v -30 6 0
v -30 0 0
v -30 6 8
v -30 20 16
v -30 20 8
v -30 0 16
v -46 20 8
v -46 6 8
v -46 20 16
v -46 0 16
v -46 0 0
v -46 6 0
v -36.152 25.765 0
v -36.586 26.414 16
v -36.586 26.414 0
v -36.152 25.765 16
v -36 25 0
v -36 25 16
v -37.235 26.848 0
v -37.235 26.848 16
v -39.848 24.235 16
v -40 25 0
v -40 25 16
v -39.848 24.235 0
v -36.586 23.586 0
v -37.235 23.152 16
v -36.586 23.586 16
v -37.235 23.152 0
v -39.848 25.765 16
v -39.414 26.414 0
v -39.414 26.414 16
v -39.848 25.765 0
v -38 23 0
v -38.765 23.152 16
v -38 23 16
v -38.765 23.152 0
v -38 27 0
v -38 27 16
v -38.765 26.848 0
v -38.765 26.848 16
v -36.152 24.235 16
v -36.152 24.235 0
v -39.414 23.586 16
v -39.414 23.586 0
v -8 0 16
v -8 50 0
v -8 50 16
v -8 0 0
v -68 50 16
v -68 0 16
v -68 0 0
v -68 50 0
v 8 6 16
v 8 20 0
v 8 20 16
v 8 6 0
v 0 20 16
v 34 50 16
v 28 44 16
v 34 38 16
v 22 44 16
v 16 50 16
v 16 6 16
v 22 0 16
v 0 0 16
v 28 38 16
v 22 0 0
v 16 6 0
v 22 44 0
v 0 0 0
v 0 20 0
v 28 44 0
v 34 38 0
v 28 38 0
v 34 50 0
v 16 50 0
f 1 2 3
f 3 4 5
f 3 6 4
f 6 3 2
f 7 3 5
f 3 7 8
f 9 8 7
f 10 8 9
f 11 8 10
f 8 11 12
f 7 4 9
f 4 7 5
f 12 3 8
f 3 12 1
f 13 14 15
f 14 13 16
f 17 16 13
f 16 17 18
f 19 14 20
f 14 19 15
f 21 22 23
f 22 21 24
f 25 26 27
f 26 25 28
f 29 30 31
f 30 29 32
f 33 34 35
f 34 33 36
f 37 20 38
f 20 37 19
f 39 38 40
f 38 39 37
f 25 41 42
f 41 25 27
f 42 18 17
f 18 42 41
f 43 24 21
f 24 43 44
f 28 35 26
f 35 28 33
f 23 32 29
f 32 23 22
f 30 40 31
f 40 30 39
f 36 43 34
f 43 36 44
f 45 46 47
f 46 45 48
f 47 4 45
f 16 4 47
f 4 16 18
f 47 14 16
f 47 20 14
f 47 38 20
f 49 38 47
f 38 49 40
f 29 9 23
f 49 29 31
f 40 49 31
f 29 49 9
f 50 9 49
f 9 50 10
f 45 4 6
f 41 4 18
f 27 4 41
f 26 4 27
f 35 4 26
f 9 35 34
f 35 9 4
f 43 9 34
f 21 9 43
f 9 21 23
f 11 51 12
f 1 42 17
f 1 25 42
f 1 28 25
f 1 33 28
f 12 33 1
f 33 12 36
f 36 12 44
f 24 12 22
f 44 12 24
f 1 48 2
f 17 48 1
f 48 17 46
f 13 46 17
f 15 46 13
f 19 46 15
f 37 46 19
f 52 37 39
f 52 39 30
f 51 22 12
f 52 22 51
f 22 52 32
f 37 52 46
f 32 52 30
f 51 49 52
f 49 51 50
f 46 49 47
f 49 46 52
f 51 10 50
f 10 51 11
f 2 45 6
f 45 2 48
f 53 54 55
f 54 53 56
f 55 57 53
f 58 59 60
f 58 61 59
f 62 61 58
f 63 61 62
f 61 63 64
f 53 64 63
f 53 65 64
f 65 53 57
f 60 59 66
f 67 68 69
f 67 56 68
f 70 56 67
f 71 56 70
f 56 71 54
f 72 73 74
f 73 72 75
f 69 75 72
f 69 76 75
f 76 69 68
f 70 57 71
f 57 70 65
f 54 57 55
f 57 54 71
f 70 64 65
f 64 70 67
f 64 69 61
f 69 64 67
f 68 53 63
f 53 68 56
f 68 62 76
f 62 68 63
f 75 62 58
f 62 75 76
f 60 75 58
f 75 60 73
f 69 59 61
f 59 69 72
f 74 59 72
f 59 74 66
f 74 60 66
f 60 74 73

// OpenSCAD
th = 16; // material
fr = 8; // drillbit size
screw = 4; // screwhole diameter

h = 50;
nhooks = 1;
hookdist = 60;
l = nhooks * hookdist;

hookdepth = 6; // hook/thin thickness
hookangle = 75; // 90 = up, 0 = flat

//translate([0, - h - fr, 0])
translate([-l - fr, 0, 0])
difference() {
    cube([l, h, th]);
    for (i = [0:nhooks]) {
        xdist = (l - (nhooks-1)*hookdist)/2 + i * hookdist;
        translate([xdist, -5, th]) cube([th, h, th], true);
        translate([xdist, 0, th/2]) cube([th, 2*hookdepth, 2*th], true);
        
        if (i == 0 || i == nhooks) {
            translate([xdist, h/2, -th/2]) cylinder(2*th, screw/2, screw/2, $fn=16);
        }
    }
}

for (i = [1:nhooks]) {
    translate([(i-1) * (3*th/2+fr), 0, 0])
    union() {
    cube([th/2, h/2-5, th]); // back hook
    cube([th+hookdepth, hookdepth, th]); // top
    translate([th, 0, 0]) cube([hookdepth, h, th]); // down
    translate([th, h-hookdepth, 0]) cube([3*hookdepth, hookdepth, th]); // bottom
    translate([th+2*hookdepth, h-2*hookdepth, 0]) cube([hookdepth, 2*hookdepth, th]); // hanger
    }
}
